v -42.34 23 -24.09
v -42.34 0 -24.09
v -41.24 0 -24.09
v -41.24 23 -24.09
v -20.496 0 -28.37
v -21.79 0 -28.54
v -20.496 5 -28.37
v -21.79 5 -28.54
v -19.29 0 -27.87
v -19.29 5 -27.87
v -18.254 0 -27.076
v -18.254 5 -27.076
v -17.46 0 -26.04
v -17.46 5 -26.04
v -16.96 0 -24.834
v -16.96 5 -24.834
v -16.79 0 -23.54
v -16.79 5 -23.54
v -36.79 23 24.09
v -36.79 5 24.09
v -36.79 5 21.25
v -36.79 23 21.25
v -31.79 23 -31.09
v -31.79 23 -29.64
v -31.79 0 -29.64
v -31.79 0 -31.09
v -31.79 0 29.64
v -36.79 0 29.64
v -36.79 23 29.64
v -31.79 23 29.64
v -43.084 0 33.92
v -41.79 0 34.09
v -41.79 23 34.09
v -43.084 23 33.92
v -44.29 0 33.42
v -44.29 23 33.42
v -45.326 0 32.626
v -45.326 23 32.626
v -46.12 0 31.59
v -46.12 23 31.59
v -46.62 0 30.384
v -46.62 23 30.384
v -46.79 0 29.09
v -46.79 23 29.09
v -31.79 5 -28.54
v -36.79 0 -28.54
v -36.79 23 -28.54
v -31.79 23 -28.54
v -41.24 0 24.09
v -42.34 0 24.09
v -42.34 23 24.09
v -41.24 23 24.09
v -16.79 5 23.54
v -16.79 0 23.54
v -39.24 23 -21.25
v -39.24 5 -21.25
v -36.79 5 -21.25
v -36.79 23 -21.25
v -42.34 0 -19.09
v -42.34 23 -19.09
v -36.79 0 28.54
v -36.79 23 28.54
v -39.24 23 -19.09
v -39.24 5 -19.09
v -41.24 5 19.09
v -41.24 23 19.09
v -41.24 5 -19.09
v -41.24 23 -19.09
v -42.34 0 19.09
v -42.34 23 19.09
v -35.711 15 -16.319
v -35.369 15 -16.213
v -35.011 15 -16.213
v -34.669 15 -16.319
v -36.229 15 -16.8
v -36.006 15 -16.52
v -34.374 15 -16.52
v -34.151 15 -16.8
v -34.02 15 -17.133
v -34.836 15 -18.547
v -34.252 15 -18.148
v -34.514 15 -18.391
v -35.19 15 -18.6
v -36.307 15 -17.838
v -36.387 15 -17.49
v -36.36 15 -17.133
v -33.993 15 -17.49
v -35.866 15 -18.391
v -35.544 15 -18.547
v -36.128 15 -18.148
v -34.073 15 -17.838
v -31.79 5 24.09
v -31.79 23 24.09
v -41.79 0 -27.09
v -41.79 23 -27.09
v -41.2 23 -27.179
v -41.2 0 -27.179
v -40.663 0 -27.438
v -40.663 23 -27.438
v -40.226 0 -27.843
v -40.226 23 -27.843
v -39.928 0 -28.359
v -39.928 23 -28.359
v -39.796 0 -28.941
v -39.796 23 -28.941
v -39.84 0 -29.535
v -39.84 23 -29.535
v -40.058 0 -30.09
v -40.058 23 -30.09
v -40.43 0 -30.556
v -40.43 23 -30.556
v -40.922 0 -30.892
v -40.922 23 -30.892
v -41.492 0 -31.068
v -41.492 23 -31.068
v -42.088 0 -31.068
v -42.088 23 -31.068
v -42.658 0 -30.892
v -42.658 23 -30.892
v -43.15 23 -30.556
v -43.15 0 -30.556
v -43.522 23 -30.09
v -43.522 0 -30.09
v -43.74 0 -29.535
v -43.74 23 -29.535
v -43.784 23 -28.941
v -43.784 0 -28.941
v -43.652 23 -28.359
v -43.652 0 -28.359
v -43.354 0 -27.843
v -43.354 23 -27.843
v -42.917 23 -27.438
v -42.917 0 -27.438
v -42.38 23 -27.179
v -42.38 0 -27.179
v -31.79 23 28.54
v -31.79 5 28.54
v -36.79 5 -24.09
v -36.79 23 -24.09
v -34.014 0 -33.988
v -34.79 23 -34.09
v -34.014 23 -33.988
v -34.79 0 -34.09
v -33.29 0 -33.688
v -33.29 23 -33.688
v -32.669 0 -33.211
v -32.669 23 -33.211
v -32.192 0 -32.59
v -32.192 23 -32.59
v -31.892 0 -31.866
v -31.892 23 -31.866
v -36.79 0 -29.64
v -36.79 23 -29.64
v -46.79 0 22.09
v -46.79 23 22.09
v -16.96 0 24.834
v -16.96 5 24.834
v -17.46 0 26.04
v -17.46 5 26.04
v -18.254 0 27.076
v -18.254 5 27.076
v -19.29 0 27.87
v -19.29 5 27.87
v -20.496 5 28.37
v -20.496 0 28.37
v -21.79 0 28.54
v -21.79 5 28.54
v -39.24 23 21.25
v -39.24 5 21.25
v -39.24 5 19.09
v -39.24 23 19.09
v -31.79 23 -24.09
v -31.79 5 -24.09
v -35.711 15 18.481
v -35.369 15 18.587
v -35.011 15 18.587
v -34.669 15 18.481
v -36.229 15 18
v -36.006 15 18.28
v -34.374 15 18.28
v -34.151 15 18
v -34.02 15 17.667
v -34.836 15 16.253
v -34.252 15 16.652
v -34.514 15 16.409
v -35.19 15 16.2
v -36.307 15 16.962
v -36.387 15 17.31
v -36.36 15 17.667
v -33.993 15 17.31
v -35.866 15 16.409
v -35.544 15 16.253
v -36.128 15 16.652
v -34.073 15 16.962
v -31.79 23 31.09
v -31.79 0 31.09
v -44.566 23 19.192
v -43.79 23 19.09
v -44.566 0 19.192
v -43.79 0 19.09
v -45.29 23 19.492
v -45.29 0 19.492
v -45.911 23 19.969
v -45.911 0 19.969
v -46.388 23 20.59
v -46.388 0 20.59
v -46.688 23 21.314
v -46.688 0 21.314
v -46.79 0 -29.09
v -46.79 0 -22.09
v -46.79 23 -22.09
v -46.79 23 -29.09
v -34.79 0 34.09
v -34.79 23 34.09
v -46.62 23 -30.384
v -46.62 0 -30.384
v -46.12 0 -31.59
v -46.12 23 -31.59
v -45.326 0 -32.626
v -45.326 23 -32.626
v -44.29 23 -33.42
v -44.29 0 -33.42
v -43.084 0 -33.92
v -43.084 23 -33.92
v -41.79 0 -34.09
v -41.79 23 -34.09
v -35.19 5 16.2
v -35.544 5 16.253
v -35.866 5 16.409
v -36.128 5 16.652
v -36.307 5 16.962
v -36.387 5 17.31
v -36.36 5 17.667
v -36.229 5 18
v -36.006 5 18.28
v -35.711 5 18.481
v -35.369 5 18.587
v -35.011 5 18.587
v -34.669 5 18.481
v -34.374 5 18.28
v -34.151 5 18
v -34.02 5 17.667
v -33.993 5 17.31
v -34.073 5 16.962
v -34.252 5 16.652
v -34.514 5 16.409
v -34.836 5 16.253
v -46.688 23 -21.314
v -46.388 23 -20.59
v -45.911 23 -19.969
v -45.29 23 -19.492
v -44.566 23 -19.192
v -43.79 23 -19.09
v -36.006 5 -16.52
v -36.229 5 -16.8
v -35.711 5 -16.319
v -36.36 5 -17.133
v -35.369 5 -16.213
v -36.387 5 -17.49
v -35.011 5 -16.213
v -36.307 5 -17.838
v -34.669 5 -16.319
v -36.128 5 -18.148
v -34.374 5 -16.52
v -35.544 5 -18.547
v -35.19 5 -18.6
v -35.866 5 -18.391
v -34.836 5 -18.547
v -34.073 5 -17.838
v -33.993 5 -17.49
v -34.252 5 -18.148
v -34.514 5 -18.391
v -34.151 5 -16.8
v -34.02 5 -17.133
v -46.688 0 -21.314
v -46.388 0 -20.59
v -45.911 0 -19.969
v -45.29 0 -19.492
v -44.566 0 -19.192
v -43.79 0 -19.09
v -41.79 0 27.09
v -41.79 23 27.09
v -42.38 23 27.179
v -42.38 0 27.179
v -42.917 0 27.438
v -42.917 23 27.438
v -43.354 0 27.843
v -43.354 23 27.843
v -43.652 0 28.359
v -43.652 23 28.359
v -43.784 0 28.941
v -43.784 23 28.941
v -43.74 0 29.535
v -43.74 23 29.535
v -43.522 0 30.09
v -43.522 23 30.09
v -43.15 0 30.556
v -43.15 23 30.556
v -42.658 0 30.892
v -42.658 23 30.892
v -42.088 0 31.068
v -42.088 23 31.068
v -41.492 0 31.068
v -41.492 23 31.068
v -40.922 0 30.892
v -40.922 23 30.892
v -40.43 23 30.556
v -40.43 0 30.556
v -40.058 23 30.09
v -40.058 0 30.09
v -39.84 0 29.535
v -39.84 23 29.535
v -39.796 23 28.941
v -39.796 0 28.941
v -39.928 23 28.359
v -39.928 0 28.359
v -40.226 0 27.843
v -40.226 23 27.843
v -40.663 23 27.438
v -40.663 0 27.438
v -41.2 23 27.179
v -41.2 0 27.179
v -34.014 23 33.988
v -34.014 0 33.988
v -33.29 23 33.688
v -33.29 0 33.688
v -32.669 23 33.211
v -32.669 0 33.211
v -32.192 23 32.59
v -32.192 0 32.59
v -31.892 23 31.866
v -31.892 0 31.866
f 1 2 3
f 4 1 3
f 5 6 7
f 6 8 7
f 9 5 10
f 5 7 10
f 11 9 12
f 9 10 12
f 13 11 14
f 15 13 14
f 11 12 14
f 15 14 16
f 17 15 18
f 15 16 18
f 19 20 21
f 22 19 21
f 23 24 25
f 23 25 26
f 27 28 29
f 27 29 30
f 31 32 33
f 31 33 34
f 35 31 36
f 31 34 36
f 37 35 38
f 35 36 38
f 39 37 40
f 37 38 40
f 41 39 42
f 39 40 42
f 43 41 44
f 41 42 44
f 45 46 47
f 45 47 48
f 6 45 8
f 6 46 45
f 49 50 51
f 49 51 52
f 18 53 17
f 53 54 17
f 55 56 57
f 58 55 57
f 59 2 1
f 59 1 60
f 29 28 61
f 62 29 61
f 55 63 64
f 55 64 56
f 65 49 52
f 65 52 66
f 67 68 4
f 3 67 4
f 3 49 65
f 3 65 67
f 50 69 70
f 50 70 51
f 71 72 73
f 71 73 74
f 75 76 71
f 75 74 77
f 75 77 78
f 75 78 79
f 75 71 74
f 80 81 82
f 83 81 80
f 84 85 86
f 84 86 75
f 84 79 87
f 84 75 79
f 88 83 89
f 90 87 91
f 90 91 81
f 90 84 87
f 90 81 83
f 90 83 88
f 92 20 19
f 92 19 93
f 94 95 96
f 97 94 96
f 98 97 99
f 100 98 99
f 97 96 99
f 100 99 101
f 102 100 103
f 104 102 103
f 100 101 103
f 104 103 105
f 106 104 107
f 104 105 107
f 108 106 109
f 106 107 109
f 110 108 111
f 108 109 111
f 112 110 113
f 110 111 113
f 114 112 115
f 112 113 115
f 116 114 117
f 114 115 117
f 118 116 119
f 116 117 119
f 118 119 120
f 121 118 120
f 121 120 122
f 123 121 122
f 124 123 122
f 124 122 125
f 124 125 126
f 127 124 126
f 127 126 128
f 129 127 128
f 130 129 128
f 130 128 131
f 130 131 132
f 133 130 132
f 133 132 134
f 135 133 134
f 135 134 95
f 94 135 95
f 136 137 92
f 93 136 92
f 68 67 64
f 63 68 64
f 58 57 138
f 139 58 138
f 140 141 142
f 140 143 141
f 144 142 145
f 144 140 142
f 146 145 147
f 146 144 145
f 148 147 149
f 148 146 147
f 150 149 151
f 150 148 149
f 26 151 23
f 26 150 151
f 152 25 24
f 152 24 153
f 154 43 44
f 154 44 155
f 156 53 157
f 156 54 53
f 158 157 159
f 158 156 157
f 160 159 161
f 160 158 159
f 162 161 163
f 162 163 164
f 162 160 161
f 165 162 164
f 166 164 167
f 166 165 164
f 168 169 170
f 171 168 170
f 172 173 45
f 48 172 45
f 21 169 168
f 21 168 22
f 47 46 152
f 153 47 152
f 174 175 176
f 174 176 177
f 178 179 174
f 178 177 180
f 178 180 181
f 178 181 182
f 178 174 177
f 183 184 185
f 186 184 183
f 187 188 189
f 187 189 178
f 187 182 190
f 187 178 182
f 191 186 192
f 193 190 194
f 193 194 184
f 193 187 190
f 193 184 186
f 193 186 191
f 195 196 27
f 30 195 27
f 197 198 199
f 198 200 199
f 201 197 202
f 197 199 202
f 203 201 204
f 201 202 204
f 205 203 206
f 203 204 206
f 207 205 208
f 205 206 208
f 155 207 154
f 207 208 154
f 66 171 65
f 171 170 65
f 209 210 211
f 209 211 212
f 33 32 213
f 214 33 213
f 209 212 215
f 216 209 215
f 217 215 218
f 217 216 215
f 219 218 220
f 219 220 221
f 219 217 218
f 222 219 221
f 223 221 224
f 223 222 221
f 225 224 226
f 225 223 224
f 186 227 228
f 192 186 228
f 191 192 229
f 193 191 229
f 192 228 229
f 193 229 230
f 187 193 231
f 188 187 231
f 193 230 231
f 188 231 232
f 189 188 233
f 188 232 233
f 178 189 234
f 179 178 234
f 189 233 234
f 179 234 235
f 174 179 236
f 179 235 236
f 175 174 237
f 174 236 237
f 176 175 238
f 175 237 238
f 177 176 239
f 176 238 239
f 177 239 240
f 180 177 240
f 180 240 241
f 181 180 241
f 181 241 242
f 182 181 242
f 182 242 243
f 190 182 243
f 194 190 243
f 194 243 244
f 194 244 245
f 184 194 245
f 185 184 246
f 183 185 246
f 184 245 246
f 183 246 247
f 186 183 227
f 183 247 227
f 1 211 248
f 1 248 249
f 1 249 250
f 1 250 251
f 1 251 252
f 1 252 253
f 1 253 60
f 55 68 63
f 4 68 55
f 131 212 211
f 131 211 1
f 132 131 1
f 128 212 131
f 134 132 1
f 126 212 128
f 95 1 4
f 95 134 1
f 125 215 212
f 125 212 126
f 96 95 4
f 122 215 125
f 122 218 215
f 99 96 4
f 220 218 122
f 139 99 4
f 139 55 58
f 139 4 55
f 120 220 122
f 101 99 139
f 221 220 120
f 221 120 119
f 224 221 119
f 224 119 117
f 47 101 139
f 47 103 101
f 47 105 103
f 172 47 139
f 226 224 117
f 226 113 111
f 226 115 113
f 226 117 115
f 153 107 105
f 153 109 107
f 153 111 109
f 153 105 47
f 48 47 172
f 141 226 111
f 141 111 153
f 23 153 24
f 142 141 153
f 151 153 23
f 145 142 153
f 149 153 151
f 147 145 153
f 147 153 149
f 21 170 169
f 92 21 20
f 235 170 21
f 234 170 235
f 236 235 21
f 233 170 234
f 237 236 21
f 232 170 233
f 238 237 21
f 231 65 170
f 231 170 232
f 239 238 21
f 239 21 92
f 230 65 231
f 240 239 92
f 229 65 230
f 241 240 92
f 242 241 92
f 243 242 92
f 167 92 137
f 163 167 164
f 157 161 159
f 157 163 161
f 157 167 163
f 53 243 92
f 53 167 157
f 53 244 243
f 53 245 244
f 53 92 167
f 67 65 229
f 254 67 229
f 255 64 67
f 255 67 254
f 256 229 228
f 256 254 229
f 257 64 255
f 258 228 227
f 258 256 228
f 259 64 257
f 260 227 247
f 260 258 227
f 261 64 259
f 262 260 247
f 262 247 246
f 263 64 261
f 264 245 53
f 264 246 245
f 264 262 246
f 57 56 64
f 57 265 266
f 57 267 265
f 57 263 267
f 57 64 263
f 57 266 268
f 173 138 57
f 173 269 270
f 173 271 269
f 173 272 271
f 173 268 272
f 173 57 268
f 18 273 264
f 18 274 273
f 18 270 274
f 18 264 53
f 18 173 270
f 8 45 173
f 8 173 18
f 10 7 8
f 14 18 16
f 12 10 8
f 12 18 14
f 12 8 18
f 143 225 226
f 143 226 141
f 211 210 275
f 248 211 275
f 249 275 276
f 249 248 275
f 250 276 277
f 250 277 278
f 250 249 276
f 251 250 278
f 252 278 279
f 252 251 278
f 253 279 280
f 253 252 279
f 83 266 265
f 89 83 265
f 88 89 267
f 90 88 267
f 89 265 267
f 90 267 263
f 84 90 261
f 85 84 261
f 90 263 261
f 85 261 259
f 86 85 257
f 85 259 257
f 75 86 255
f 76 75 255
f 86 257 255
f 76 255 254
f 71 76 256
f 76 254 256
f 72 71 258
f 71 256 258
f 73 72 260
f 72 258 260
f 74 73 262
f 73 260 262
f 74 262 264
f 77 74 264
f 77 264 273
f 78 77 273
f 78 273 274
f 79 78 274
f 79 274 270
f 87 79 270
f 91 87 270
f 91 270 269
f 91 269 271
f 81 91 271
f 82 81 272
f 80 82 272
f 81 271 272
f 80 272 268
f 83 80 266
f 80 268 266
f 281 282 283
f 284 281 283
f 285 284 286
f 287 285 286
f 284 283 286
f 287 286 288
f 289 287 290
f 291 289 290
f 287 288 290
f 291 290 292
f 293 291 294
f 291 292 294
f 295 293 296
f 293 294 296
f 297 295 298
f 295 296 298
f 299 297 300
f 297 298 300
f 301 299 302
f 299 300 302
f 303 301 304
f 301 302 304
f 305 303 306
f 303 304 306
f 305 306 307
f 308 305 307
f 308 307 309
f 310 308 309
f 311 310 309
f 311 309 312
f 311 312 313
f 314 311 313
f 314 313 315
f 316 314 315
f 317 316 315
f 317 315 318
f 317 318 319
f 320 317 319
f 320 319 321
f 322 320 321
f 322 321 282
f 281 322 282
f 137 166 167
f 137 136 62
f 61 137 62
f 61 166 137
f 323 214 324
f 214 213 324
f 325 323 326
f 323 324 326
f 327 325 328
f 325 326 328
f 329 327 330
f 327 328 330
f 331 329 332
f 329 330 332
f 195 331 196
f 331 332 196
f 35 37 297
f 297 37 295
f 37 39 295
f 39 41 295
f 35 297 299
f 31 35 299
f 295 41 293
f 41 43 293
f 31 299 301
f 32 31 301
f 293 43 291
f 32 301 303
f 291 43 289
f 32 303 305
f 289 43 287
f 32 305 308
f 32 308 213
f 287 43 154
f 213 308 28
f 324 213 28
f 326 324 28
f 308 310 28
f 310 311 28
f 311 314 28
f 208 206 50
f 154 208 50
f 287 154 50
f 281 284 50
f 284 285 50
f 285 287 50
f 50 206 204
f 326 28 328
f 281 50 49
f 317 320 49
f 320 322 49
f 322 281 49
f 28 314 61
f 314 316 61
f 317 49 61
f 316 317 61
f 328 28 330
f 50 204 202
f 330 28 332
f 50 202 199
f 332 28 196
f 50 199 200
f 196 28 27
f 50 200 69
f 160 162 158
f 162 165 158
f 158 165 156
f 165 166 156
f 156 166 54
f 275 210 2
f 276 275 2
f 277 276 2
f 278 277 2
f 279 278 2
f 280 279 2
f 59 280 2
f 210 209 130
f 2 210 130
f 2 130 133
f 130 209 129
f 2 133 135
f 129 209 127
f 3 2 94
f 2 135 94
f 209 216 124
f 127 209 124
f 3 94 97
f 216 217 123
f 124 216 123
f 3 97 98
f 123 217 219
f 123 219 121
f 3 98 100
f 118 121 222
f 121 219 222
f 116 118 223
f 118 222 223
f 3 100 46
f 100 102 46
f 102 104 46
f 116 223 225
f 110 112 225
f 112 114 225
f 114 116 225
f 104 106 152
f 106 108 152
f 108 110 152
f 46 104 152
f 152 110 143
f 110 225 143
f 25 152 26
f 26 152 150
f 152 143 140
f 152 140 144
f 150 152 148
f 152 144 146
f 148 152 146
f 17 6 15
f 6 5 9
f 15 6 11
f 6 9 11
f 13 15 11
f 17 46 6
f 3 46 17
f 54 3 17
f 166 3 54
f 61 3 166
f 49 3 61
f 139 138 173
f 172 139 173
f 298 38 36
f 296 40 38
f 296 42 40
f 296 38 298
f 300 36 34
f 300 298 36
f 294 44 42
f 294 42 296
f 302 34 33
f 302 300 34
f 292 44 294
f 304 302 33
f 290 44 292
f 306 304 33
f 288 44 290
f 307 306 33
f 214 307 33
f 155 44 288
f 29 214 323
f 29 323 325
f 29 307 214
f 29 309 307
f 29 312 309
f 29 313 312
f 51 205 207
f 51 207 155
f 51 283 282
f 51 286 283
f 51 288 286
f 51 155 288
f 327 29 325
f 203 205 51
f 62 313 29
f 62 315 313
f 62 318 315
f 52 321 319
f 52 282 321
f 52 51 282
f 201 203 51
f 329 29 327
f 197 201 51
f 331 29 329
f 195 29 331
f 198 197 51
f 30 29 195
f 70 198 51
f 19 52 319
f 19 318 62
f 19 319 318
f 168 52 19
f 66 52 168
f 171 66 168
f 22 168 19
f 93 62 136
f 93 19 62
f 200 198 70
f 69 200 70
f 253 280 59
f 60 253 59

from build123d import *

# Parameters (mm, degrees)
SKETCH1_W                  = 93.58
SKETCH1_H                  = 68.18
BASE_DEPTH                 = 5
SKETCH1_3_W                = 4.45
SKETCH1_3_H                = 4.45
SKETCH1_3_W_2              = 1.1
SKETCH1_3_H_2              = 1.1
SKETCH1_3_H_3              = 5
SKETCH1_3_W_3              = 5
WALLS_DEPTH                = 23
SKETCH1_4_W                = 63.58
SKETCH1_4_H                = 1.1
SKETCH1_4_W_2              = 5
SKETCH1_4_W_3              = 1.1
SKETCH1_4_H_2              = 5
SKETCH1_4_H_3              = 38.18
ACRYLIC_CUT_DEPTH          = 23
SKETCH2_W                  = 4.45
SKETCH2_H                  = 38.18
SKETCH2_W_2                = 63.58
SKETCH2_H_2                = 4.45
CUT_EXTRUDE2_DEPTH         = 63.293115189
SKETCH3_W                  = 58
SKETCH3_H                  = 42.5
BOARD_CUTOUT_DEPTH         = 18
SKETCH3_2_R                = 1.2
SCREW_HOLES_DEPTH          = 10
FILLET1_R                  = 5
FILLET3_R                  = 3
SKETCH6_R                  = 2
CUT_EXTRUDE3_DEPTH         = 63.293115189
BOTTOM_HALF_CUT_DEPTH      = 61.625342886
BOTTOM_HALF_CUT_DEPTH_BACK = 61.625342886
SKETCH5_W                  = 63.58
SKETCH5_H                  = 68.18
FILLET4_R                  = 5


with BuildPart() as part:
    # Sketch1 → Base (new body)
    with BuildSketch(Plane(origin=(0, 0, 0), x_dir=(1, 0, 0), z_dir=(0, 1, 0))):
        Rectangle(SKETCH1_W, SKETCH1_H)
    extrude(amount=BASE_DEPTH)

    # Sketch1<3> → Walls (add)
    with BuildSketch(Plane(origin=(0, 0, 0), x_dir=(1, 0, 0), z_dir=(0, 1, 0))):
        with Locations((-44.565, 31.865)):
            Rectangle(SKETCH1_3_W, SKETCH1_3_H)
        with Locations((-39.015, 31.865)):
            Rectangle(SKETCH1_3_W, SKETCH1_3_H)
        with Locations((-39.015, 26.315)):
            Rectangle(SKETCH1_3_W, SKETCH1_3_H)
        with Locations((-44.565, 26.315)):
            Rectangle(SKETCH1_3_W, SKETCH1_3_H)
        with Locations((-41.79, 31.865)):
            Rectangle(SKETCH1_3_W_2, SKETCH1_3_H)
        with Locations((-39.015, 29.09)):
            Rectangle(SKETCH1_3_W, SKETCH1_3_H_2)
        with Locations((-44.565, 29.09)):
            Rectangle(SKETCH1_3_W, SKETCH1_3_H_2)
        with Locations((-41.79, 26.315)):
            Rectangle(SKETCH1_3_W_2, SKETCH1_3_H)
        with Locations((-41.79, 29.09)):
            Rectangle(SKETCH1_3_W_2, SKETCH1_3_H_2)
        with Locations((-39.015, 21.59)):
            Rectangle(SKETCH1_3_W, SKETCH1_3_H_3)
        with Locations((-44.565, 21.59)):
            Rectangle(SKETCH1_3_W, SKETCH1_3_H_3)
        with Locations((-34.29, 26.315)):
            Rectangle(SKETCH1_3_W_3, SKETCH1_3_H)
        with Locations((-34.29, 31.865)):
            Rectangle(SKETCH1_3_W_3, SKETCH1_3_H)
        with Locations((-44.565, -21.59)):
            Rectangle(SKETCH1_3_W, SKETCH1_3_H_3)
        with Locations((-39.015, -21.59)):
            Rectangle(SKETCH1_3_W, SKETCH1_3_H_3)
        with Locations((-39.015, -26.315)):
            Rectangle(SKETCH1_3_W, SKETCH1_3_H)
        with Locations((-44.565, -26.315)):
            Rectangle(SKETCH1_3_W, SKETCH1_3_H)
        with Locations((-44.565, -31.865)):
            Rectangle(SKETCH1_3_W, SKETCH1_3_H)
        with Locations((-39.015, -31.865)):
            Rectangle(SKETCH1_3_W, SKETCH1_3_H)
        with Locations((-34.29, -31.865)):
            Rectangle(SKETCH1_3_W_3, SKETCH1_3_H)
        with Locations((-34.29, -26.315)):
            Rectangle(SKETCH1_3_W_3, SKETCH1_3_H)
        with Locations((-39.015, -29.09)):
            Rectangle(SKETCH1_3_W, SKETCH1_3_H_2)
        with Locations((-44.565, -29.09)):
            Rectangle(SKETCH1_3_W, SKETCH1_3_H_2)
        with Locations((-41.79, -31.865)):
            Rectangle(SKETCH1_3_W_2, SKETCH1_3_H)
        with Locations((-41.79, -29.09)):
            Rectangle(SKETCH1_3_W_2, SKETCH1_3_H_2)
        with Locations((-41.79, -26.315)):
            Rectangle(SKETCH1_3_W_2, SKETCH1_3_H)
        with Locations((34.29, -31.865)):
            Rectangle(SKETCH1_3_W_3, SKETCH1_3_H)
        with Locations((34.29, -26.315)):
            Rectangle(SKETCH1_3_W_3, SKETCH1_3_H)
        with Locations((39.015, -26.315)):
            Rectangle(SKETCH1_3_W, SKETCH1_3_H)
        with Locations((39.015, -31.865)):
            Rectangle(SKETCH1_3_W, SKETCH1_3_H)
        with Locations((44.565, -31.865)):
            Rectangle(SKETCH1_3_W, SKETCH1_3_H)
        with Locations((44.565, -26.315)):
            Rectangle(SKETCH1_3_W, SKETCH1_3_H)
        with Locations((39.015, -21.59)):
            Rectangle(SKETCH1_3_W, SKETCH1_3_H_3)
        with Locations((44.565, -21.59)):
            Rectangle(SKETCH1_3_W, SKETCH1_3_H_3)
        with Locations((41.79, -26.315)):
            Rectangle(SKETCH1_3_W_2, SKETCH1_3_H)
        with Locations((41.79, -29.09)):
            Rectangle(SKETCH1_3_W_2, SKETCH1_3_H_2)
        with Locations((41.79, -31.865)):
            Rectangle(SKETCH1_3_W_2, SKETCH1_3_H)
        with Locations((39.015, -29.09)):
            Rectangle(SKETCH1_3_W, SKETCH1_3_H_2)
        with Locations((44.565, -29.09)):
            Rectangle(SKETCH1_3_W, SKETCH1_3_H_2)
        with Locations((44.565, 21.59)):
            Rectangle(SKETCH1_3_W, SKETCH1_3_H_3)
        with Locations((34.29, 26.315)):
            Rectangle(SKETCH1_3_W_3, SKETCH1_3_H)
        with Locations((39.015, 21.59)):
            Rectangle(SKETCH1_3_W, SKETCH1_3_H_3)
        with Locations((34.29, 31.865)):
            Rectangle(SKETCH1_3_W_3, SKETCH1_3_H)
        with Locations((39.015, 26.315)):
            Rectangle(SKETCH1_3_W, SKETCH1_3_H)
        with Locations((39.015, 31.865)):
            Rectangle(SKETCH1_3_W, SKETCH1_3_H)
        with Locations((44.565, 31.865)):
            Rectangle(SKETCH1_3_W, SKETCH1_3_H)
        with Locations((44.565, 26.315)):
            Rectangle(SKETCH1_3_W, SKETCH1_3_H)
        with Locations((41.79, 26.315)):
            Rectangle(SKETCH1_3_W_2, SKETCH1_3_H)
        with Locations((41.79, 31.865)):
            Rectangle(SKETCH1_3_W_2, SKETCH1_3_H)
        with Locations((39.015, 29.09)):
            Rectangle(SKETCH1_3_W, SKETCH1_3_H_2)
        with Locations((41.79, 29.09)):
            Rectangle(SKETCH1_3_W_2, SKETCH1_3_H_2)
        with Locations((44.565, 29.09)):
            Rectangle(SKETCH1_3_W, SKETCH1_3_H_2)
        with Locations((-41.79, 21.59)):
            Rectangle(SKETCH1_3_W_2, SKETCH1_3_H_3)
        with Locations((-34.29, 29.09)):
            Rectangle(SKETCH1_3_W_3, SKETCH1_3_H_2)
        with Locations((-41.79, -21.59)):
            Rectangle(SKETCH1_3_W_2, SKETCH1_3_H_3)
        with Locations((-34.29, -29.09)):
            Rectangle(SKETCH1_3_W_3, SKETCH1_3_H_2)
        with Locations((34.29, -29.09)):
            Rectangle(SKETCH1_3_W_3, SKETCH1_3_H_2)
        with Locations((41.79, -21.59)):
            Rectangle(SKETCH1_3_W_2, SKETCH1_3_H_3)
        with Locations((41.79, 21.59)):
            Rectangle(SKETCH1_3_W_2, SKETCH1_3_H_3)
        with Locations((34.29, 29.09)):
            Rectangle(SKETCH1_3_W_3, SKETCH1_3_H_2)
    extrude(amount=WALLS_DEPTH)

    # Sketch1<4> → Acrylic Cut (cut)
    with BuildSketch(Plane(origin=(0, 0, 0), x_dir=(1, 0, 0), z_dir=(0, 1, 0))):
        with Locations((0, -29.09)):
            Rectangle(SKETCH1_4_W, SKETCH1_4_H)
        with Locations((-34.29, -29.09)):
            Rectangle(SKETCH1_4_W_2, SKETCH1_4_H)
        with Locations((34.29, -29.09)):
            Rectangle(SKETCH1_4_W_2, SKETCH1_4_H)
        with Locations((-41.79, -21.59)):
            Rectangle(SKETCH1_4_W_3, SKETCH1_4_H_2)
        with Locations((-41.79, 0)):
            Rectangle(SKETCH1_4_W_3, SKETCH1_4_H_3)
        with Locations((-41.79, 21.59)):
            Rectangle(SKETCH1_4_W_3, SKETCH1_4_H_2)
        with Locations((0, 29.09)):
            Rectangle(SKETCH1_4_W, SKETCH1_4_H)
        with Locations((-34.29, 29.09)):
            Rectangle(SKETCH1_4_W_2, SKETCH1_4_H)
        with Locations((34.29, 29.09)):
            Rectangle(SKETCH1_4_W_2, SKETCH1_4_H)
        with Locations((41.79, 21.59)):
            Rectangle(SKETCH1_4_W_3, SKETCH1_4_H_2)
        with Locations((41.79, 0)):
            Rectangle(SKETCH1_4_W_3, SKETCH1_4_H_3)
        with Locations((41.79, -21.59)):
            Rectangle(SKETCH1_4_W_3, SKETCH1_4_H_2)
    extrude(amount=ACRYLIC_CUT_DEPTH, mode=Mode.SUBTRACT)

    # Sketch2 → Cut-Extrude2 (cut, through all)
    with BuildSketch(Plane(origin=(0, 23, 0), x_dir=(1, 0, 0), z_dir=(0, 1, 0))):
        with Locations((-44.565, 0)):
            Rectangle(SKETCH2_W, SKETCH2_H)
        with Locations((0, 31.865)):
            Rectangle(SKETCH2_W_2, SKETCH2_H_2)
        with Locations((44.565, 0)):
            Rectangle(SKETCH2_W, SKETCH2_H)
        with Locations((0, -31.865)):
            Rectangle(SKETCH2_W_2, SKETCH2_H_2)
    extrude(amount=-CUT_EXTRUDE2_DEPTH, mode=Mode.SUBTRACT)

    # Sketch3 → Board Cutout (cut)
    with BuildSketch(Plane(origin=(0, 5, 0), x_dir=(1, 0, 0), z_dir=(0, 1, 0))):
        with Locations((-10.24, 0)):
            Rectangle(SKETCH3_W, SKETCH3_H)
    extrude(amount=BOARD_CUTOUT_DEPTH, mode=Mode.SUBTRACT)

    # Sketch3<2> → Screw Holes (add)
    with BuildSketch(Plane(origin=(0, 5, 0), x_dir=(1, 0, 0), z_dir=(0, 1, 0))):
        with Locations(Location((-35.19, -17.4, 0), (0, 0, 90))):
            Circle(SKETCH3_2_R)
        with Locations(Location((14.71, -17.4, 0), (0, 0, 90))):
            Circle(SKETCH3_2_R)
        with Locations(Location((14.71, 17.4, 0), (0, 0, 90))):
            Circle(SKETCH3_2_R)
        with Locations(Location((-35.19, 17.4, 0), (0, 0, 90))):
            Circle(SKETCH3_2_R)
    extrude(amount=SCREW_HOLES_DEPTH)

    # Fillet1
    fillet1_edges = [part.edges().sort_by_distance(p)[0] for p in [
        (-46.79, 11.5, 34.09),
        (46.79, 11.5, 34.09),
        (46.79, 11.5, -34.09),
        (-46.79, 11.5, -34.09),
    ]]
    fillet(fillet1_edges, radius=FILLET1_R)

    # Fillet3
    fillet3_edges = [part.edges().sort_by_distance(p)[0] for p in [
        (46.79, 11.5, -19.09),
        (31.79, 11.5, -34.09),
        (-31.79, 11.5, -34.09),
        (-46.79, 11.5, -19.09),
        (-31.79, 11.5, 34.09),
        (-46.79, 11.5, 19.09),
        (46.79, 11.5, 19.09),
        (31.79, 11.5, 34.09),
    ]]
    fillet(fillet3_edges, radius=FILLET3_R)

    # Sketch6 → Cut-Extrude3 (cut, through all)
    with BuildSketch(Plane(origin=(0, 23, 0), x_dir=(1, 0, 0), z_dir=(0, 1, 0))):
        with Locations(Location((-41.79, 29.09, 0), (0, 0, 270))):
            Circle(SKETCH6_R)
        with Locations(Location((41.79, 29.09, 0), (0, 0, 90))):
            Circle(SKETCH6_R)
        with Locations(Location((41.79, -29.09, 0), (0, 0, 270))):
            Circle(SKETCH6_R)
        with Locations(Location((-41.79, -29.09, 0), (0, 0, 90))):
            Circle(SKETCH6_R)
    extrude(amount=-CUT_EXTRUDE3_DEPTH, mode=Mode.SUBTRACT)

    # Sketch5 → Bottom Half Cut (cut, two sides: drawn at the far end of the back side and taken through both)
    with BuildSketch(Plane(origin=(0, 5, 0), x_dir=(1, 0, 0), z_dir=(0, 1, 0)).offset(-BOTTOM_HALF_CUT_DEPTH_BACK)):
        with Locations((15, 0)):
            Rectangle(SKETCH5_W, SKETCH5_H)
    extrude(amount=BOTTOM_HALF_CUT_DEPTH + BOTTOM_HALF_CUT_DEPTH_BACK, mode=Mode.SUBTRACT)

    # Fillet4
    fillet4_edges = [part.edges().sort_by_distance(p)[0] for p in [
        (-16.79, 2.5, 28.54),
        (-16.79, 2.5, -28.54),
    ]]
    fillet(fillet4_edges, radius=FILLET4_R)


solid = part.part
